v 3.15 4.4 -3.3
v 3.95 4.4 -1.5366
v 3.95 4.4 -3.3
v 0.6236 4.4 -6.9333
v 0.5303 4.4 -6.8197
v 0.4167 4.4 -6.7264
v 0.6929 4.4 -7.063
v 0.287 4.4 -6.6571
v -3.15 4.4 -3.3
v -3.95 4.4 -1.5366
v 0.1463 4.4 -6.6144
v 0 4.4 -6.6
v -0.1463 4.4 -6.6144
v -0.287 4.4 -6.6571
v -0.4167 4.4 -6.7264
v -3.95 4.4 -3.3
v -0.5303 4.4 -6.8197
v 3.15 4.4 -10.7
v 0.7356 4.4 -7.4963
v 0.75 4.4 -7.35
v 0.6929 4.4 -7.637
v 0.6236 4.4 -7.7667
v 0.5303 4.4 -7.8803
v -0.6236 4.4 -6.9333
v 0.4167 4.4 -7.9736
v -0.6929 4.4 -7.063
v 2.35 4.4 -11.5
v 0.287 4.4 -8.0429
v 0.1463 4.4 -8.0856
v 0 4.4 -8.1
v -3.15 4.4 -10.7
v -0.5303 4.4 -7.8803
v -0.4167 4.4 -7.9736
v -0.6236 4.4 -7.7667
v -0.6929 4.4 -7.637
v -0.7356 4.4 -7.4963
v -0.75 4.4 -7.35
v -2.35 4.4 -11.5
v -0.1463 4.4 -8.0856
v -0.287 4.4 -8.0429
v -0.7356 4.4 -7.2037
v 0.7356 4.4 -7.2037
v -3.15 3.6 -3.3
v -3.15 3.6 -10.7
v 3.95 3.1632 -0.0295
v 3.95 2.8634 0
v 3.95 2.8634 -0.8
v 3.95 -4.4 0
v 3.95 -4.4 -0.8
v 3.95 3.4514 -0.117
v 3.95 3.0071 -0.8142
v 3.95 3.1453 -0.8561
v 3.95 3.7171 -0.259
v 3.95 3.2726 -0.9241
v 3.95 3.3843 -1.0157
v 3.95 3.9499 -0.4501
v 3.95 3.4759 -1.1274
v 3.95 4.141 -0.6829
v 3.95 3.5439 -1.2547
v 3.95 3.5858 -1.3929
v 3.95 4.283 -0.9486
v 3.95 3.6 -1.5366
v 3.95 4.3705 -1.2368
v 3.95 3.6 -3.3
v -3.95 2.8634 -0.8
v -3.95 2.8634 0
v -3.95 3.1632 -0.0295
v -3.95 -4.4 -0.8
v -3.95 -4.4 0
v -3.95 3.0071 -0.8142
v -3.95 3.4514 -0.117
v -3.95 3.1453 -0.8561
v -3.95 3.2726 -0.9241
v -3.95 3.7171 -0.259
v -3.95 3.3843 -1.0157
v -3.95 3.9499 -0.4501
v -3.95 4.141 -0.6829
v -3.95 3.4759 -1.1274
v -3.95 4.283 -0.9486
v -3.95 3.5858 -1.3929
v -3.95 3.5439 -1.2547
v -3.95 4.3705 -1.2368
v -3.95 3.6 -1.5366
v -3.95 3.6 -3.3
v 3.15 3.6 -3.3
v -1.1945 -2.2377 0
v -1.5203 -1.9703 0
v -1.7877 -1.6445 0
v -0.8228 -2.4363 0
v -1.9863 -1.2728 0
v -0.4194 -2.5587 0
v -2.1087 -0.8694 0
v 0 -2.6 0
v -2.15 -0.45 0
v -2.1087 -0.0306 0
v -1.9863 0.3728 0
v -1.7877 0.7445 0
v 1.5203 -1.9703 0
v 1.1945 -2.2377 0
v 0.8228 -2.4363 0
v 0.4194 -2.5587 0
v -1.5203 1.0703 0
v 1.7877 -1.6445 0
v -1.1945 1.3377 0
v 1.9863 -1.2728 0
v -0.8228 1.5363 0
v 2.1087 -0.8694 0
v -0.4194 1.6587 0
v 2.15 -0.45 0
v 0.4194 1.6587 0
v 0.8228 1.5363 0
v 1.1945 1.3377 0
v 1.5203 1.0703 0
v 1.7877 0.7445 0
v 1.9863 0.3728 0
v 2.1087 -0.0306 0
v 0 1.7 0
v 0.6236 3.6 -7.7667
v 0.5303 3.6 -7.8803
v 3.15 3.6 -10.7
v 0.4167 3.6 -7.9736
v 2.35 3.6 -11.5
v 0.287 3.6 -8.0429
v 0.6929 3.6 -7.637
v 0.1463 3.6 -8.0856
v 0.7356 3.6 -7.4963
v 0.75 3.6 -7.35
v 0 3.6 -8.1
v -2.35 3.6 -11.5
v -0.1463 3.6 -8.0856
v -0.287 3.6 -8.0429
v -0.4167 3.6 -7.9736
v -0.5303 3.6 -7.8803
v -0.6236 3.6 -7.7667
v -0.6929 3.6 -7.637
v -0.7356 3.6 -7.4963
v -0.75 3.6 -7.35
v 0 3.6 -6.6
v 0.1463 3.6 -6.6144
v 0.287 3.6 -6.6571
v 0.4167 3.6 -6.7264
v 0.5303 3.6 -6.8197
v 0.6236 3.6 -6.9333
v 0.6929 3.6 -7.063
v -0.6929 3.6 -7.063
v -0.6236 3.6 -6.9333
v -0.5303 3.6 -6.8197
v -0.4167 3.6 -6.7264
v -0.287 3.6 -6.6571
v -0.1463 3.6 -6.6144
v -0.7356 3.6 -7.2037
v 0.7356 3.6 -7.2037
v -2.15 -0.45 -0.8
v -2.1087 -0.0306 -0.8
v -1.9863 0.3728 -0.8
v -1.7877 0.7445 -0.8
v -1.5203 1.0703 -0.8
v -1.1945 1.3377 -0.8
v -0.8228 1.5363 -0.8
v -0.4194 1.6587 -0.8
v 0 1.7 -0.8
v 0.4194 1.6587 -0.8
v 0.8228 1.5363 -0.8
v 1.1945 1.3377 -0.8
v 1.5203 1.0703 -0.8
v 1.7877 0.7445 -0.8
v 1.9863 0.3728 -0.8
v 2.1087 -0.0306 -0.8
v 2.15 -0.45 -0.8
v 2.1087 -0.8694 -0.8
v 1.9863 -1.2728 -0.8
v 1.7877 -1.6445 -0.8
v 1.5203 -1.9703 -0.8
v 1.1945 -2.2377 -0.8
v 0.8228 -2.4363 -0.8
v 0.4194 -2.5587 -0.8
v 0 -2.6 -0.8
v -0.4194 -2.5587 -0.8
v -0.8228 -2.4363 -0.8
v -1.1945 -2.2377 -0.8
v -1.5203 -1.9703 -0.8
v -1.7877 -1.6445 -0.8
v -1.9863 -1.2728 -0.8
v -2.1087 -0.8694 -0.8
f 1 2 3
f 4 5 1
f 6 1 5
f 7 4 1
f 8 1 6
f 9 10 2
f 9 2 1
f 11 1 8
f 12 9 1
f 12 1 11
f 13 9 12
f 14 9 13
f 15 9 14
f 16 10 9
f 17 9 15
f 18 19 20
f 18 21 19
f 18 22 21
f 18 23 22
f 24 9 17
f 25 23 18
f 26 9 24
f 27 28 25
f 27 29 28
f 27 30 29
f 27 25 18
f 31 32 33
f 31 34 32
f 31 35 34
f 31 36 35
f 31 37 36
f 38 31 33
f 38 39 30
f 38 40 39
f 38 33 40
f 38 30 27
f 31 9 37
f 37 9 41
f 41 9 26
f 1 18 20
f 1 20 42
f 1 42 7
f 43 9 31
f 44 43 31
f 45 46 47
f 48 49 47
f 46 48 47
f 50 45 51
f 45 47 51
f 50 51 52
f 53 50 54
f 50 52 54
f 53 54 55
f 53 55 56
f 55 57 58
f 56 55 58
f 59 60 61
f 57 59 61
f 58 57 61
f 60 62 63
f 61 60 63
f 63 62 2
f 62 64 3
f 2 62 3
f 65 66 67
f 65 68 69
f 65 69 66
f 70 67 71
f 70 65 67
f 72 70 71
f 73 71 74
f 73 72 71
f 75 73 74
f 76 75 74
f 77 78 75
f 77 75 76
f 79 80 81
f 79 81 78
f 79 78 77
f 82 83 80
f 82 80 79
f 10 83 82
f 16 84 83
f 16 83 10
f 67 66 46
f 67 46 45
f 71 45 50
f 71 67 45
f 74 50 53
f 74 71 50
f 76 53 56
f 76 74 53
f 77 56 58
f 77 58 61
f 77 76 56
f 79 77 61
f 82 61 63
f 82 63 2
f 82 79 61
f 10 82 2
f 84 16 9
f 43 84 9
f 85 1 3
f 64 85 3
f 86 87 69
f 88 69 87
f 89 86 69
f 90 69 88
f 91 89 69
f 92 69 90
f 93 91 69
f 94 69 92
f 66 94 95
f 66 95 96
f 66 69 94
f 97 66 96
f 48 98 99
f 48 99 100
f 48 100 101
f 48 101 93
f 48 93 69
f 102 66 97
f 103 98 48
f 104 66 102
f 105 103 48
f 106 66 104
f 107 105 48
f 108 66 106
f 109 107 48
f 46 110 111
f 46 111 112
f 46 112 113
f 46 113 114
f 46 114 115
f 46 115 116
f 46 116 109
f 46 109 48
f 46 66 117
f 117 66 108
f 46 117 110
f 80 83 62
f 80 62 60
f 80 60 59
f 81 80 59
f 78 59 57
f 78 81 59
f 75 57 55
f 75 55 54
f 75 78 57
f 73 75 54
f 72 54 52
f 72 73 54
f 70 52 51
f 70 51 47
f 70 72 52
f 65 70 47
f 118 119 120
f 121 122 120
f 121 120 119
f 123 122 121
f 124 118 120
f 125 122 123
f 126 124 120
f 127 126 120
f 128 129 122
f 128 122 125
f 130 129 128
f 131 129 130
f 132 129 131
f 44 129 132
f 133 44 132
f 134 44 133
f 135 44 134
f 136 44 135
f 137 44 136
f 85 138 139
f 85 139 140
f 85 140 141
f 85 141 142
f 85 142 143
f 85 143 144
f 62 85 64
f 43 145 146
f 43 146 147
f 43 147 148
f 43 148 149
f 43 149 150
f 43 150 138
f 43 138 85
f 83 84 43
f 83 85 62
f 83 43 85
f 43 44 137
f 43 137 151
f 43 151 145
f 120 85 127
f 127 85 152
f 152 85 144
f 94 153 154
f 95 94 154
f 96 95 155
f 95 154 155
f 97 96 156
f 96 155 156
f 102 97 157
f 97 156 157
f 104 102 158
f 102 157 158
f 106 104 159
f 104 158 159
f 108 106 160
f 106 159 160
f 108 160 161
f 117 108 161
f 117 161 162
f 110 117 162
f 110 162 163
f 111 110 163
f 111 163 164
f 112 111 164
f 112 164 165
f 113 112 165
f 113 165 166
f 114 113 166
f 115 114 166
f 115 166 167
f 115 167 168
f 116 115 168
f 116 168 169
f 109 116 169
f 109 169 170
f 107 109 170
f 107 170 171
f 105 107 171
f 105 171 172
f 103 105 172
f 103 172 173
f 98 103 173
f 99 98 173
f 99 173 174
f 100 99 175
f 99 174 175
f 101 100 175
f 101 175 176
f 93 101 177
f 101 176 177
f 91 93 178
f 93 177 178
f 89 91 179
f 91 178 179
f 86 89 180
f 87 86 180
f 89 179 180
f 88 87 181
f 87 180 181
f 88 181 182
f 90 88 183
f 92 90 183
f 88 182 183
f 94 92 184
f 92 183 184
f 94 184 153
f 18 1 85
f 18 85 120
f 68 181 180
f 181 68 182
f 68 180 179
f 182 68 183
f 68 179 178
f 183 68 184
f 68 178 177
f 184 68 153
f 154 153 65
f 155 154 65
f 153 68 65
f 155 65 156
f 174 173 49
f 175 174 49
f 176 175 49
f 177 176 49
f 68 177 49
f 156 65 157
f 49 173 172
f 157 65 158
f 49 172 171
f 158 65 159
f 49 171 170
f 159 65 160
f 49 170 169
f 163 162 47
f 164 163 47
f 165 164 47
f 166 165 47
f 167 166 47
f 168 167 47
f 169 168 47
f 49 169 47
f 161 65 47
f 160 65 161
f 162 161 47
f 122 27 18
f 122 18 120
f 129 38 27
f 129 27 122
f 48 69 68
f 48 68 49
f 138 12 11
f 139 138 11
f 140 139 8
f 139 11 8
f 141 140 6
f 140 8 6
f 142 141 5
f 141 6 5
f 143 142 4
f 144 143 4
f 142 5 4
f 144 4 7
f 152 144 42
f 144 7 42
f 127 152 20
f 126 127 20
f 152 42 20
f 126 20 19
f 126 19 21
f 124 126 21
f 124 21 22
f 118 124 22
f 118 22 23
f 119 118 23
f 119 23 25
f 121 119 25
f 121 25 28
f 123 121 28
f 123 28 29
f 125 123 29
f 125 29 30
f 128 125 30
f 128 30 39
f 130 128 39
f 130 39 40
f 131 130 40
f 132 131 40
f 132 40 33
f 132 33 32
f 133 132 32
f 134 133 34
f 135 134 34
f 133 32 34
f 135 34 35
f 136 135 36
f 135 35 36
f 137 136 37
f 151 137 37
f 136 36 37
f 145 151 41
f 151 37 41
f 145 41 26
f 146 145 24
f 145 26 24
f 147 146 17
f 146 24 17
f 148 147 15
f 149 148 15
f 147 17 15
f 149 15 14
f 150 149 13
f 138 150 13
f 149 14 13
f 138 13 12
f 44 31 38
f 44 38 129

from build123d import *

# Parameters (mm, degrees)
SKETCH_1_W                       = 7.9
SKETCH_1_H                       = 8.8
SM_BASE_FLANGE_1_DEPTH           = 0.8
SM_EDGE_FLANGE_1_STRIP_W         = 4.6732
SM_EDGE_FLANGE_1_STRIP_H         = 0.8
SM_EDGE_FLANGE_1_STRIP_CUT_DEPTH = 7.9
SM_EDGE_FLANGE_1_DEPTH           = 7.9
SKETCH_7_R                       = 2.15
CUT_EXTRUDE_1_DEPTH              = 10
SKETCH_8_W                       = 0.8
SKETCH_8_H                       = 8.2
CUT_EXTRUDE_2_DEPTH              = 10
SKETCH_9_R                       = 0.75
CUT_EXTRUDE_3_DEPTH              = 10
CHAMFER_1_SIZE                   = 0.8


# Sheet-metal steps are written as plain solids
with BuildPart() as part:
    # Sketch 1 → 基体-法兰1 (new body)
    with BuildSketch(Plane.XY):
        Rectangle(SKETCH_1_W, SKETCH_1_H)
    extrude(amount=-SM_BASE_FLANGE_1_DEPTH)

    # 边线-法兰1 strip (across the edge) → 边线-法兰1 strip cut (cut)
    with BuildSketch(Plane(origin=(-3.95, 4.4, -0.8), x_dir=(0, -1, 0), z_dir=(1, 0, 0))):
        with Locations((-0.8, -0.4)):
            Rectangle(SM_EDGE_FLANGE_1_STRIP_W, SM_EDGE_FLANGE_1_STRIP_H)
    extrude(amount=SM_EDGE_FLANGE_1_STRIP_CUT_DEPTH, mode=Mode.SUBTRACT)

    # 边线-法兰1 section (across the edge) → 边线-法兰1 (add)
    with BuildSketch(Plane(origin=(-3.95, 4.4, -0.8), x_dir=(0, -1, 0), z_dir=(1, 0, 0))):
        with BuildLine():
            Line((0, 0.7366), (0, 10.7))
            Line((0, 10.7), (0.8, 10.7))
            Line((0.8, 10.7), (0.8, 0.7366))
            ThreePointArc((0.8, 0.7366), (1.015745145, 0.215745145), (1.5366, 0))
            Line((1.5366, 0), (1.5366, -0.8))
            ThreePointArc((1.5366, -0.8), (0.45005972, -0.34994028), (0, 0.7366))
        make_face()
    extrude(amount=SM_EDGE_FLANGE_1_DEPTH)

    # 草图7 → 切除-拉伸1 (cut)
    with BuildSketch(Plane(origin=(0, 0, -0.8), x_dir=(-1, 0, 0), z_dir=(0, 0, -1))):
        with Locations((0, -0.45)):
            Circle(SKETCH_7_R)
    extrude(amount=-CUT_EXTRUDE_1_DEPTH, mode=Mode.SUBTRACT)

    # 草图8 → 切除-拉伸2 (cut)
    with BuildSketch(Plane(origin=(0, 4.4, 0), x_dir=(1, 0, 0), z_dir=(0, 1, 0))):
        with Locations((3.55, 7.4)):
            Rectangle(SKETCH_8_W, SKETCH_8_H)
        with Locations((-3.55, 7.4)):
            Rectangle(SKETCH_8_W, SKETCH_8_H)
    extrude(amount=-CUT_EXTRUDE_2_DEPTH, mode=Mode.SUBTRACT)

    # 草图9 → 切除-拉伸3 (cut)
    with BuildSketch(Plane(origin=(0, 4.4, 0), x_dir=(1, 0, 0), z_dir=(0, 1, 0))):
        with Locations(Location((0, 7.35, 0), (0, 0, 270))):
            Circle(SKETCH_9_R)
    extrude(amount=-CUT_EXTRUDE_3_DEPTH, mode=Mode.SUBTRACT)

    # 倒角1
    chamfer_1_edges = [part.edges().sort_by_distance(p)[0] for p in [
        (-3.15, 4, -11.5),
        (3.15, 4, -11.5),
    ]]
    chamfer(chamfer_1_edges, length=CHAMFER_1_SIZE)


solid = part.part
